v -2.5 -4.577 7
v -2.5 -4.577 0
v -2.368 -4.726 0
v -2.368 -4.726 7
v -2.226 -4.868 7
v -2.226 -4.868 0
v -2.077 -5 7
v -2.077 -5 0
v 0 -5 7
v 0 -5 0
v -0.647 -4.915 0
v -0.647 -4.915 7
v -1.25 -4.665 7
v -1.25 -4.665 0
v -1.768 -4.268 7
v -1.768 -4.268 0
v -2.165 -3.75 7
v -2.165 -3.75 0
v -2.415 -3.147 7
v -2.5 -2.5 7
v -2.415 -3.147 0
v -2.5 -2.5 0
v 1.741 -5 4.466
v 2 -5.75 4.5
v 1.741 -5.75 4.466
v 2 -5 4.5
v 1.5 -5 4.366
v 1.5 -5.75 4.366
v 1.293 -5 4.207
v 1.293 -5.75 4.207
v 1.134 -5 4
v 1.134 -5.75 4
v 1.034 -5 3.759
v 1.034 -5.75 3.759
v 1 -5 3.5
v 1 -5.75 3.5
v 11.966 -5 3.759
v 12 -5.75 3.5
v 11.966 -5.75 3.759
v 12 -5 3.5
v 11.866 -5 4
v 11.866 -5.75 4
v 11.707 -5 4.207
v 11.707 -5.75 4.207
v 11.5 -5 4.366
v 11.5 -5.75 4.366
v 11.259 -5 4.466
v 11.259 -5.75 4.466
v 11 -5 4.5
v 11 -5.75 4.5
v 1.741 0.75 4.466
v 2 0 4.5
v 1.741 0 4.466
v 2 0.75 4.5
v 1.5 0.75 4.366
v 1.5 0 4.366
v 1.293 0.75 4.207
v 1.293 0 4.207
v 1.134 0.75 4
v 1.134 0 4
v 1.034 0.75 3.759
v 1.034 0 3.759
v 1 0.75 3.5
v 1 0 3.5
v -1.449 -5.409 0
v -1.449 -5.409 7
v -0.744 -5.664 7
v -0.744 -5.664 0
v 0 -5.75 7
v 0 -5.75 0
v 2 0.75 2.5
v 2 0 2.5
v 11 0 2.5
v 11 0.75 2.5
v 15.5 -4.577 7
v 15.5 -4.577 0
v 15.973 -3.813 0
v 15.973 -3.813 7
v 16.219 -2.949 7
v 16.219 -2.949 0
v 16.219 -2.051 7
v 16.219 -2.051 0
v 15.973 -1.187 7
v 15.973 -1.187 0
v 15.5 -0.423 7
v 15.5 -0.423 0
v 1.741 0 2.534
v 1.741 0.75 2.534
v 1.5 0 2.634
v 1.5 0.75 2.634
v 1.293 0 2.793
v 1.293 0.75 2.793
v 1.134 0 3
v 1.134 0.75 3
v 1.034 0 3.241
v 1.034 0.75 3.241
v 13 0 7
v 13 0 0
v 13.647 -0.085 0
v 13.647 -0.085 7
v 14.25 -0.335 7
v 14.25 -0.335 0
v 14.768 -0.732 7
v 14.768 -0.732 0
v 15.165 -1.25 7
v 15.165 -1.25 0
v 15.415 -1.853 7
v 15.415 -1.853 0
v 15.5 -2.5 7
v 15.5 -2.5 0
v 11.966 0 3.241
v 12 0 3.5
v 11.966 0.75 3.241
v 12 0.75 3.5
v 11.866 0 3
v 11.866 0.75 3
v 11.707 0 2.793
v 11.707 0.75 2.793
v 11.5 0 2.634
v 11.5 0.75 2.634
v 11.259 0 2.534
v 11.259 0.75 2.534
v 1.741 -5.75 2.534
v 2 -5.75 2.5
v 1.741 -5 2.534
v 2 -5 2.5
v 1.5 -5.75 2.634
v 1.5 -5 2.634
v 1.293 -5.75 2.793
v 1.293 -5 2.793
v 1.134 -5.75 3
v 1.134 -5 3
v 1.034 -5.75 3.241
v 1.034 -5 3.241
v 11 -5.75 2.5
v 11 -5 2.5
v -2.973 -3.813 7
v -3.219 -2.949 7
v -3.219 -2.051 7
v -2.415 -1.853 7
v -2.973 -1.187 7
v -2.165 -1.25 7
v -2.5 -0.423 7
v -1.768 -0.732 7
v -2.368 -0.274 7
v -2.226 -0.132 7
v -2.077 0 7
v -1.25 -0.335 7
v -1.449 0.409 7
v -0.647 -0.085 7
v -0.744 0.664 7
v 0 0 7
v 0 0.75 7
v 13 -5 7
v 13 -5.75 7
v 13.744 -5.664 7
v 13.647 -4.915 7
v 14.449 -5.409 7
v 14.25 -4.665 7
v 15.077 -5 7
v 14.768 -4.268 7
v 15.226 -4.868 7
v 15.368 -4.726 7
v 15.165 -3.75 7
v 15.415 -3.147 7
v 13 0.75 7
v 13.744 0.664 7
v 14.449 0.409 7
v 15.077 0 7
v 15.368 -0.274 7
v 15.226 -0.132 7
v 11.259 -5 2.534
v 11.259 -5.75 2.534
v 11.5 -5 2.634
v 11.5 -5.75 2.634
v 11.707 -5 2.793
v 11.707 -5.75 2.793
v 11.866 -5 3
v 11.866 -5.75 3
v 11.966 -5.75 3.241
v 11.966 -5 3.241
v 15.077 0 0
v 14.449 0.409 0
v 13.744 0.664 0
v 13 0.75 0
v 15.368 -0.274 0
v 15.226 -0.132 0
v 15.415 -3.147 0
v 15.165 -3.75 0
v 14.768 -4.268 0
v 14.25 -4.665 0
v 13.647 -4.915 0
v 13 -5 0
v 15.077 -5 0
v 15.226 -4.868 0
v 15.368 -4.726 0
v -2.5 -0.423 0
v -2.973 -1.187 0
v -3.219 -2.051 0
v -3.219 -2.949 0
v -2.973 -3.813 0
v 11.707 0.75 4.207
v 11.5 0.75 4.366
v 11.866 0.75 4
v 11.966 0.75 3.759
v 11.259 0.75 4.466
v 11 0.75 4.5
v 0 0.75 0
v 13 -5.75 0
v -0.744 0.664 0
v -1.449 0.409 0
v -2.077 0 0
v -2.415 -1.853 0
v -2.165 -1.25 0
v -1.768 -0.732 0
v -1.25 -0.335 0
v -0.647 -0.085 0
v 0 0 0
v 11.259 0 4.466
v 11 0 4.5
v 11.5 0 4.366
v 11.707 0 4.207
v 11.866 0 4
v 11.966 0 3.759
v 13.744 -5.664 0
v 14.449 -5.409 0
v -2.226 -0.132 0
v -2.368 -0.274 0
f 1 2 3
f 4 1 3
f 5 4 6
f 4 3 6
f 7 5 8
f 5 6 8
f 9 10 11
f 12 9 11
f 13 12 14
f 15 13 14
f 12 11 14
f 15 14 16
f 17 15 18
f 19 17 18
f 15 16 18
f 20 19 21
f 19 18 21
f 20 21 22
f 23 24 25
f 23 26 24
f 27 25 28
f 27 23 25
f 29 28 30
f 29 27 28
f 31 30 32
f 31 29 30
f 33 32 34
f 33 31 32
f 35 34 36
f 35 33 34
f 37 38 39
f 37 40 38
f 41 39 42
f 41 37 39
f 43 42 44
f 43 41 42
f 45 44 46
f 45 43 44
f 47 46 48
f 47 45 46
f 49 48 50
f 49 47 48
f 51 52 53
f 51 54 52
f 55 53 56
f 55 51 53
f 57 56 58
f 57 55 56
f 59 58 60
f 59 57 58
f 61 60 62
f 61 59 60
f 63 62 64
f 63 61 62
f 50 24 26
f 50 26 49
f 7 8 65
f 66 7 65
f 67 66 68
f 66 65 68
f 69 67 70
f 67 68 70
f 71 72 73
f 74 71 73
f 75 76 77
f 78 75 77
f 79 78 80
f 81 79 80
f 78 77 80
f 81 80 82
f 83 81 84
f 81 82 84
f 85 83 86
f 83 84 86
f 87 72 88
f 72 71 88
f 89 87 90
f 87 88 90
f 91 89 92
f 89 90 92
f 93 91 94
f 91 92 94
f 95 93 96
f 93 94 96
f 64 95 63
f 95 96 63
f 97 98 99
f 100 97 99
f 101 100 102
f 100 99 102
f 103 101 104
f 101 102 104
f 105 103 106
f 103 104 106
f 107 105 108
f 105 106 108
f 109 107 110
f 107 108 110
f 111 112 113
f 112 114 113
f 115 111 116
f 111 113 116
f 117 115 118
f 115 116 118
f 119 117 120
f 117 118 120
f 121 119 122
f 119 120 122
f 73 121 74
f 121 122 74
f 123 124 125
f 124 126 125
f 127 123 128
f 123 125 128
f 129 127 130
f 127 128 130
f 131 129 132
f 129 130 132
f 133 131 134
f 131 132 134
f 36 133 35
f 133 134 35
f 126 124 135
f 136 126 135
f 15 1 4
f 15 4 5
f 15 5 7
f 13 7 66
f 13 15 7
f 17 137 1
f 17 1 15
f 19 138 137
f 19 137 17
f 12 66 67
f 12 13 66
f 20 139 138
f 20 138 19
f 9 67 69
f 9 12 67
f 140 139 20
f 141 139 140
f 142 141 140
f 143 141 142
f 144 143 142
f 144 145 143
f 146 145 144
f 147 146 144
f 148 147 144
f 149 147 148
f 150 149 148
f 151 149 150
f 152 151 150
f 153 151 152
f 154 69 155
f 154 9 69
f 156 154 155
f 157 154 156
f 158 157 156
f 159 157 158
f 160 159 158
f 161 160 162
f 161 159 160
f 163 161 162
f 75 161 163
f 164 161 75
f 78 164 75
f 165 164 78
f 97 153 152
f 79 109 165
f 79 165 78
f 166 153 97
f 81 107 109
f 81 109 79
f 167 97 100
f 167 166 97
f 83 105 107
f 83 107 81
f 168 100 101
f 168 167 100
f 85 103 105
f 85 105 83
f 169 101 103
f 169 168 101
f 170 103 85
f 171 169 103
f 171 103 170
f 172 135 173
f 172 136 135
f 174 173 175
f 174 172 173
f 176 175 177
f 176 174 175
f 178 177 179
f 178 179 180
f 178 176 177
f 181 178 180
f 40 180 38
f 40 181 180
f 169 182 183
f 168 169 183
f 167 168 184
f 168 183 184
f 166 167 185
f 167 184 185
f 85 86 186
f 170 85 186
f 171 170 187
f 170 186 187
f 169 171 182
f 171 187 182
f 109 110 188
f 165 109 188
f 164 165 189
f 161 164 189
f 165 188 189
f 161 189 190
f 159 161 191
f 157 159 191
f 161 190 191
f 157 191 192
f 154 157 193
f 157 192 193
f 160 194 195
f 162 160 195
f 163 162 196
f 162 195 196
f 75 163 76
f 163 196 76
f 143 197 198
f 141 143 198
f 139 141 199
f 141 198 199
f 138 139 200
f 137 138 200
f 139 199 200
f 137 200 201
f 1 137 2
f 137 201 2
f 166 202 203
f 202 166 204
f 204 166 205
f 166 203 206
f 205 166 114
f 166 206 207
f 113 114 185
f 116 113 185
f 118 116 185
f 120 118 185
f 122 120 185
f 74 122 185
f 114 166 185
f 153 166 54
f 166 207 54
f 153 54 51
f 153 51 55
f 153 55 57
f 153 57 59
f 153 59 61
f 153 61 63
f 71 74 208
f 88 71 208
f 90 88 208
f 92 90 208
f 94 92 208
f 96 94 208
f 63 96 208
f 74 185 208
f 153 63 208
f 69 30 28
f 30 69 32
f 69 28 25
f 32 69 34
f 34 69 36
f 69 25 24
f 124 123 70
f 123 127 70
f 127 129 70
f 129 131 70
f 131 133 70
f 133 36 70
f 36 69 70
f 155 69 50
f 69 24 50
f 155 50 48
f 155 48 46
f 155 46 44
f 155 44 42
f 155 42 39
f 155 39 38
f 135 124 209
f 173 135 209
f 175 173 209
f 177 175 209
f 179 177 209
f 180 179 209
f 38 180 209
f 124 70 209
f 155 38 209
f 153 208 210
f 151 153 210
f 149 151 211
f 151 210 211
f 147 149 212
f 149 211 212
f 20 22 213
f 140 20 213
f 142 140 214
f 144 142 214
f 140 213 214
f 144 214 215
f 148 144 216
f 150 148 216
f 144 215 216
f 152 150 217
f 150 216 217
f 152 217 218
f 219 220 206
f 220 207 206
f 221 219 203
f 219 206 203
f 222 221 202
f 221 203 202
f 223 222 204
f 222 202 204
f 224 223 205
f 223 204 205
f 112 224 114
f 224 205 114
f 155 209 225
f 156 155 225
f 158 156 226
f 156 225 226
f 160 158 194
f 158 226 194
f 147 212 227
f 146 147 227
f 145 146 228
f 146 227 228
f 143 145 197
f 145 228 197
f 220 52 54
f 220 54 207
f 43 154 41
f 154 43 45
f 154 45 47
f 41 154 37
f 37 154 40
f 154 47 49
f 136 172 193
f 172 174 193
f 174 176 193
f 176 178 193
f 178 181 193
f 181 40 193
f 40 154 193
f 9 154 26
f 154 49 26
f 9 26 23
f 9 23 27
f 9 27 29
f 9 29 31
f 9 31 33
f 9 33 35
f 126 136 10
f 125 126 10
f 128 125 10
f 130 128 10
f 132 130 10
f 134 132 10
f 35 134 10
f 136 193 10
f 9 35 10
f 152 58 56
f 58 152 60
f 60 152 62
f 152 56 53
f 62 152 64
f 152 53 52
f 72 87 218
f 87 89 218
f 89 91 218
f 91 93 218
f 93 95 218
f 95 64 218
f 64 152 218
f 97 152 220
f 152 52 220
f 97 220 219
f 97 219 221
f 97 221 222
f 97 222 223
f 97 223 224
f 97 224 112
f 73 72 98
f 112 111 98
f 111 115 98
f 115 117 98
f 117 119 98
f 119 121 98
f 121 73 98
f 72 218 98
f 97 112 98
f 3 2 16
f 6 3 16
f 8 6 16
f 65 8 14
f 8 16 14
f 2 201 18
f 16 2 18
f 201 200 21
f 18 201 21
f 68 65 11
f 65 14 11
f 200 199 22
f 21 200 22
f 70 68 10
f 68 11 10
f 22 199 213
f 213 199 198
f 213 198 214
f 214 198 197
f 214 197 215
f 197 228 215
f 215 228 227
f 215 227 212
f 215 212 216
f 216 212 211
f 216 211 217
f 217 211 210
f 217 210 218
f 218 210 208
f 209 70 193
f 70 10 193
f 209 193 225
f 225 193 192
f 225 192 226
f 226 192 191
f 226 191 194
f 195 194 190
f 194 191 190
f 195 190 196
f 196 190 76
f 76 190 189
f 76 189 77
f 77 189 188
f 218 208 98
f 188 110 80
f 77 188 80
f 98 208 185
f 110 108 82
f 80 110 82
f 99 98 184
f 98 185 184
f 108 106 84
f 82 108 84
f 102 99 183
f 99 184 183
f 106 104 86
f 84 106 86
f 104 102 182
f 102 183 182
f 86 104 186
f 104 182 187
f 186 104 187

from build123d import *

# Parameters (mm, degrees)
F1_DEPTH = 7
F2_W     = 11
F2_H     = 2
F3_DEPTH = 6.501
F4_R     = 0.99999


# Not quite as in the source:
# - a fillet or chamfer is up to 0.001 mm smaller than in the source, because OpenCascade refuses the exact size


with BuildPart() as f1:
    # F0 (on Top) → F1 (new body)
    with BuildSketch(Plane.XY):
        with BuildLine():
            Line((-2.0766559657, 0), (0, 0))
            Line((0, 0), (13, 0))
            Line((13, 0), (15.0766559657, 0))
            ThreePointArc((15.0766559657, 0), (14.1039701083, 0.5567548152), (13, 0.75))
            Line((13, 0.75), (0, 0.75))
            ThreePointArc((0, 0.75), (-1.1039701083, 0.5567548152), (-2.0766559657, 0))
        make_face()
        with BuildLine():
            ThreePointArc((-2.5, -2.5), (-1.767766953, -0.732233047), (0, 0))
            Line((0, 0), (-2.0766559657, 0))
            ThreePointArc((-2.0766559657, 0), (-2.2980970389, -0.2019029611), (-2.5, -0.4233440343))
            Line((-2.5, -0.4233440343), (-2.5, -2.5))
        make_face()
        with BuildLine():
            ThreePointArc((0, -5), (-1.767766953, -4.267766953), (-2.5, -2.5))
            Line((-2.5, -2.5), (-2.5, -4.5766559657))
            ThreePointArc((-2.5, -4.5766559657), (-2.2980970389, -4.7980970389), (-2.0766559657, -5))
            Line((-2.0766559657, -5), (0, -5))
        make_face()
        with BuildLine():
            Line((-2.5, -4.5766559657), (-2.5, -2.5))
            Line((-2.5, -2.5), (-2.5, -0.4233440343))
            ThreePointArc((-2.5, -0.4233440343), (-3.25, -2.5), (-2.5, -4.5766559657))
        make_face()
        with BuildLine():
            Line((15.5, -0.4233440343), (15.5, -2.5))
            Line((15.5, -2.5), (15.5, -4.5766559657))
            ThreePointArc((15.5, -4.5766559657), (16.25, -2.5), (15.5, -0.4233440343))
        make_face()
        with BuildLine():
            Line((15.0766559657, 0), (13, 0))
            ThreePointArc((13, 0), (14.767766953, -0.732233047), (15.5, -2.5))
            Line((15.5, -2.5), (15.5, -0.4233440343))
            ThreePointArc((15.5, -0.4233440343), (15.2980970389, -0.2019029611), (15.0766559657, 0))
        make_face()
        with BuildLine():
            Line((15.5, -4.5766559657), (15.5, -2.5))
            ThreePointArc((15.5, -2.5), (14.767766953, -4.267766953), (13, -5))
            Line((13, -5), (15.0766559657, -5))
            ThreePointArc((15.0766559657, -5), (15.2980970389, -4.7980970389), (15.5, -4.5766559657))
        make_face()
        with BuildLine():
            Line((13, -5), (0, -5))
            Line((0, -5), (-2.0766559657, -5))
            ThreePointArc((-2.0766559657, -5), (-1.1039701083, -5.5567548152), (0, -5.75))
            Line((0, -5.75), (13, -5.75))
            ThreePointArc((13, -5.75), (14.1039701083, -5.5567548152), (15.0766559657, -5))
            Line((15.0766559657, -5), (13, -5))
        make_face()
    extrude(amount=F1_DEPTH)

    # F2 (on face) → F3 (cut, through all)
    with BuildSketch(Plane.XZ.offset(5.75)):
        with Locations((6.5, 3.5)):
            Rectangle(F2_W, F2_H)
    extrude(amount=-F3_DEPTH, mode=Mode.SUBTRACT)

    # F4 (radius 1 in the source; OpenCascade refuses exactly that, so slightly less here)
    f4_edges = [f1.edges().sort_by_distance(p)[0] for p in [
        (1, -5.375, 4.5),
        (1, -5.375, 2.5),
        (12, -5.375, 2.5),
        (12, 0.375, 4.5),
        (12, -5.375, 4.5),
        (12, 0.375, 2.5),
        (1, 0.375, 2.5),
        (1, 0.375, 4.5),
    ]]
    fillet(f4_edges, radius=F4_R)


solid = f1.part
